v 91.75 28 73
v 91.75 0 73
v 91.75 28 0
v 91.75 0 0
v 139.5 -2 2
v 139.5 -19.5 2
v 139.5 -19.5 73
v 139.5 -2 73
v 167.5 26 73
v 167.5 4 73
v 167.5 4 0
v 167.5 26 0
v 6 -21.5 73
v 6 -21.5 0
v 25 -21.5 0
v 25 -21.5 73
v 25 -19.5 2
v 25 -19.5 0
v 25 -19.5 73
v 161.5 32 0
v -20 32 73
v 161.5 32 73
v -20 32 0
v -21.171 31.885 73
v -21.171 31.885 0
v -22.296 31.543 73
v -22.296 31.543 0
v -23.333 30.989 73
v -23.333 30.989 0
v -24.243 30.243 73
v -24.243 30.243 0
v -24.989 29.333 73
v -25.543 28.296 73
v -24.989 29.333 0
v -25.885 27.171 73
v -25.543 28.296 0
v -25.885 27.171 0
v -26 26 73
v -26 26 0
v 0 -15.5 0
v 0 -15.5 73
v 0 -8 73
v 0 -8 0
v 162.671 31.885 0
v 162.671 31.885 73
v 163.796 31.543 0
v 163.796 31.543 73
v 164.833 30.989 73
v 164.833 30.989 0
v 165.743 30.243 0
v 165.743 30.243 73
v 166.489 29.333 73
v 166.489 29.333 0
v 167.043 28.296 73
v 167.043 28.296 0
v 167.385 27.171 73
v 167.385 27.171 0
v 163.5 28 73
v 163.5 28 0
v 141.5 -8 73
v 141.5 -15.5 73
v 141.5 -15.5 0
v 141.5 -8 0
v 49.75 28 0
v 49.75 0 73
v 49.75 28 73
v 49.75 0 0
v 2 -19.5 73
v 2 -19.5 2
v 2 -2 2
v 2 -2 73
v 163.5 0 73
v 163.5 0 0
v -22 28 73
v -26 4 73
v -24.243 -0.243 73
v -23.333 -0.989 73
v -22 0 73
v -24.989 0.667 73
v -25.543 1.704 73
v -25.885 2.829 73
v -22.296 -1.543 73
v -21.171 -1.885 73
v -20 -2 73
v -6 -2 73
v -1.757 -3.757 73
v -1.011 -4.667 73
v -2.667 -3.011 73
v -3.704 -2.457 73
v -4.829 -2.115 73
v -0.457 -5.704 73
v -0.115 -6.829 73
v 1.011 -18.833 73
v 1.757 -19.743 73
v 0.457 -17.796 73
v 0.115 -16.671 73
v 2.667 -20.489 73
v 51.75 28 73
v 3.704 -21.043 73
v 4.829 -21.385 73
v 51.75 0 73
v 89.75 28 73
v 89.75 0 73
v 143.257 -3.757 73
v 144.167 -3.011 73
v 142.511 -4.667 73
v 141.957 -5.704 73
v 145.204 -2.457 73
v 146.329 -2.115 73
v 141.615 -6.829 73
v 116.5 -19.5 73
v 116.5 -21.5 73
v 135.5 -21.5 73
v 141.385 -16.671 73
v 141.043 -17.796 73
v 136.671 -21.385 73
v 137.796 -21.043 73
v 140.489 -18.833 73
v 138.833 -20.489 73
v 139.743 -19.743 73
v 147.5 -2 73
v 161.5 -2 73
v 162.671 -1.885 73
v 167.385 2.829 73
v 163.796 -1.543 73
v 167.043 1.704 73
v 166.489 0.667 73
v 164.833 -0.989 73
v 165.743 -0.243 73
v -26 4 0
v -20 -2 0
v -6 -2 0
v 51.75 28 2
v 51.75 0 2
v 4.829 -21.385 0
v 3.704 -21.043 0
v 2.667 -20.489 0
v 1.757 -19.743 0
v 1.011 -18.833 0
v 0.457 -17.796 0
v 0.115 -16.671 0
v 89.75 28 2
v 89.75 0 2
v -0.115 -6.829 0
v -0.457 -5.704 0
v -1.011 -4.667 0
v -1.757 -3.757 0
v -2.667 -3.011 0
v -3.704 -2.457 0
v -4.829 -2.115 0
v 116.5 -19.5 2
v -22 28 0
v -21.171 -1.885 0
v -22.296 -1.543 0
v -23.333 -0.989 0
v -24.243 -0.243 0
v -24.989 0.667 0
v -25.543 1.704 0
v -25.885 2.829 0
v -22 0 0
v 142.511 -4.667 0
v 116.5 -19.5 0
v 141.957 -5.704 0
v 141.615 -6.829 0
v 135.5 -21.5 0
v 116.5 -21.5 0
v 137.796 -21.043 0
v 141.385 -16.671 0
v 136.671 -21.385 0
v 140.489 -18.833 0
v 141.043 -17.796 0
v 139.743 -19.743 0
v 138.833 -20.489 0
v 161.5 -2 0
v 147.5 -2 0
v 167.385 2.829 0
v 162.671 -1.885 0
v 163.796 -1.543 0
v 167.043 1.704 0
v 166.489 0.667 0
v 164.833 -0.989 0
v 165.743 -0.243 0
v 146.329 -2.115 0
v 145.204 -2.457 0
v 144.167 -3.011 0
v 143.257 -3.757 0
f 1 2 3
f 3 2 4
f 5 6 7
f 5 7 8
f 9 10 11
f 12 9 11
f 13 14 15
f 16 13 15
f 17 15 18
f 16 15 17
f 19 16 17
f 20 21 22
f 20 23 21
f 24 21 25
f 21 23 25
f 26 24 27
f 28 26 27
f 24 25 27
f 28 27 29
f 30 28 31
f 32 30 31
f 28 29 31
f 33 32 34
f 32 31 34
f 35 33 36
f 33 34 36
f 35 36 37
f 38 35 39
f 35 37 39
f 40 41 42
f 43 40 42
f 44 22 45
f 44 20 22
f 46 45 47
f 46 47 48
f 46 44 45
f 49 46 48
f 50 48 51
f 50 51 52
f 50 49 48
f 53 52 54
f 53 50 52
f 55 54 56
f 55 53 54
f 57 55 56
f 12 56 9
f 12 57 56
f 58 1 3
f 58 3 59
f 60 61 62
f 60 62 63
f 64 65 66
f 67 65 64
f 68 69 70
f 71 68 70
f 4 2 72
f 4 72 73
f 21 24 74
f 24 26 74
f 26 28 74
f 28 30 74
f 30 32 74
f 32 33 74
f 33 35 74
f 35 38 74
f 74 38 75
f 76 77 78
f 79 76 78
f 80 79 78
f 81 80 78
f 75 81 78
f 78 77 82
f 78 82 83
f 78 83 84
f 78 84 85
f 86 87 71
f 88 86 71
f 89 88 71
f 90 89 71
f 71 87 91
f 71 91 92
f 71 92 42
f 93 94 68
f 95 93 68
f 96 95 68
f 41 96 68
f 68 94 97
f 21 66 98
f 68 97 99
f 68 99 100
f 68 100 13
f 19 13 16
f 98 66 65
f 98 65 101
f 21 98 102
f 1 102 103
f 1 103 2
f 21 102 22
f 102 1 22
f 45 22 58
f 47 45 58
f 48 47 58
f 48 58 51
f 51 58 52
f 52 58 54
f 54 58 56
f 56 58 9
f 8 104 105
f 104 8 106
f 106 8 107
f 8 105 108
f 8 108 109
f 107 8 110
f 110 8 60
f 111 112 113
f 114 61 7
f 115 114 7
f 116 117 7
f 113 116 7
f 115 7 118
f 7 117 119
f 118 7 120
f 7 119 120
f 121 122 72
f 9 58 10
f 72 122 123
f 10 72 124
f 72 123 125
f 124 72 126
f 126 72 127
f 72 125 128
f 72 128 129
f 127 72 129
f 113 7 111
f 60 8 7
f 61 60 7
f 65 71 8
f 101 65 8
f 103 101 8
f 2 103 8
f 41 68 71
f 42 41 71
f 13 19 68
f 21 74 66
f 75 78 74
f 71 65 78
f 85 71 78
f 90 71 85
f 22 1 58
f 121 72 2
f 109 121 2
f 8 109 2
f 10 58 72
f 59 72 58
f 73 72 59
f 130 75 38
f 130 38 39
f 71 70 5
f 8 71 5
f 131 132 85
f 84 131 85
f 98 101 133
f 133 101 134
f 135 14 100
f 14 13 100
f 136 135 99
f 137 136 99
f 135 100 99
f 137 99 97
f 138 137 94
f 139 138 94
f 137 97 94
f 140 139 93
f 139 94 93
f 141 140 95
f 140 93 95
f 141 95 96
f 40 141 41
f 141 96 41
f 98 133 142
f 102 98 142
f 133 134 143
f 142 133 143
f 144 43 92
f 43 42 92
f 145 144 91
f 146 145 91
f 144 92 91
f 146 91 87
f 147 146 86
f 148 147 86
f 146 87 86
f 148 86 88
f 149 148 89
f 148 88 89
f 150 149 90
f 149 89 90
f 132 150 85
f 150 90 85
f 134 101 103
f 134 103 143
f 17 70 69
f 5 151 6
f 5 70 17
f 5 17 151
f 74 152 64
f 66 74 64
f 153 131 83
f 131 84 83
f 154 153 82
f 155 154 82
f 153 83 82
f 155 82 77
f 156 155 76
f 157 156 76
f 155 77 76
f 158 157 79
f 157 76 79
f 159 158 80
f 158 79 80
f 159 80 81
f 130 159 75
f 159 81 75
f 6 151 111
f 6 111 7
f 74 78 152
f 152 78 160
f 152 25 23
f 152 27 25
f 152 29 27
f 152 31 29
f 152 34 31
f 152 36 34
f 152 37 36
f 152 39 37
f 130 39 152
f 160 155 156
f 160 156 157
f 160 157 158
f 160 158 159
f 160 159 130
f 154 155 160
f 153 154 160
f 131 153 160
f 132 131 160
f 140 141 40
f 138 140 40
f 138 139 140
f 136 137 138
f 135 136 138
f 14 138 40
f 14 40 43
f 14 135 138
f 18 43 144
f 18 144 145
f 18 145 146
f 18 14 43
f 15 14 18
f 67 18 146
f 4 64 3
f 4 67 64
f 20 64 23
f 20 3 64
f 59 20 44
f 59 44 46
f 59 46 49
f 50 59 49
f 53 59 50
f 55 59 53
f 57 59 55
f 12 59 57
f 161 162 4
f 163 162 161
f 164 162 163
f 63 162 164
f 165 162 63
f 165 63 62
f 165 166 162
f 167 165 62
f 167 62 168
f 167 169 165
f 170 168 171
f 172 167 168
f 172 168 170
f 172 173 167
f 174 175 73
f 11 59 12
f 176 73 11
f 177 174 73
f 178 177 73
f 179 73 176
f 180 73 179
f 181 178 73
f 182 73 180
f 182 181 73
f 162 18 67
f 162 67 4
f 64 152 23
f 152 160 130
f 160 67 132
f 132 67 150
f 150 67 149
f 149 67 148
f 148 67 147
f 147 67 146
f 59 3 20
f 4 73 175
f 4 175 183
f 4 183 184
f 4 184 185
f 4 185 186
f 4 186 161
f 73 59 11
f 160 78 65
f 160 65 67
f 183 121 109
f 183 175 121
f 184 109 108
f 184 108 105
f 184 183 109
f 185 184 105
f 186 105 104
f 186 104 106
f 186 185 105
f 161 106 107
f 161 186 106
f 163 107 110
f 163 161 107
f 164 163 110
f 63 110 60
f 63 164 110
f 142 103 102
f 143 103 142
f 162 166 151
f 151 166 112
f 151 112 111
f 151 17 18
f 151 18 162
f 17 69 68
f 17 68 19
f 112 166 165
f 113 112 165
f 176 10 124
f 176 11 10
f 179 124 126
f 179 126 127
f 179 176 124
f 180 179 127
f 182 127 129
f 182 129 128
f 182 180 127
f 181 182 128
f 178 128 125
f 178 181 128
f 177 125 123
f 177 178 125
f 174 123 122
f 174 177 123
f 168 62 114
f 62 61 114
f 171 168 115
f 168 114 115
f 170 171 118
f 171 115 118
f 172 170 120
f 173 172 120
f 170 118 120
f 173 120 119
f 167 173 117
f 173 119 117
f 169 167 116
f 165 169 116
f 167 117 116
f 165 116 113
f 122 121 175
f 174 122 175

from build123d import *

# Parameters (mm, degrees)
SKETCH2_W            = 141.5
SKETCH2_H            = 21.5
BOSS_EXTRUDE1_DEPTH  = 73
SHELL1_T             = -2
CUT_EXTRUDE1_REACH   = 162.666
SKETCH3_W            = 91.5
SKETCH3_H            = 2
SKETCH7_W            = 73
SKETCH7_H            = 2
BOSS_EXTRUDE5_DEPTH  = 26
SKETCH8_W            = 73
SKETCH8_H            = 2
BOSS_EXTRUDE6_DEPTH  = 26
SKETCH9_W            = 4
SKETCH9_H            = 73
BOSS_EXTRUDE7_DEPTH  = 28
SKETCH10_W           = 193.5
SKETCH10_H           = 73
BOSS_EXTRUDE8_DEPTH  = 4
SKETCH11_W           = 2
SKETCH11_H           = 73
BOSS_EXTRUDE9_DEPTH  = 28
SKETCH13_W           = 38
SKETCH13_H           = 2
BOSS_EXTRUDE10_DEPTH = 28
FILLET1_R            = 6


with BuildPart() as part:
    # Sketch2 → Boss-Extrude1 (new body)
    with BuildSketch(Plane.XY):
        with Locations((70.75, -10.75)):
            Rectangle(SKETCH2_W, SKETCH2_H)
    extrude(amount=BOSS_EXTRUDE1_DEPTH)

    # Shell1
    shell1_openings = [part.faces().sort_by_distance(p)[0] for p in [
        (70.75, -10.75, 73),
    ]]
    offset(amount=SHELL1_T, openings=shell1_openings, kind=Kind.INTERSECTION)

    # Cut-Extrude1: up to this face of the body (flat: up to its plane)
    cut_extrude1_end = Plane(part.part.faces().sort_by_distance((70.75, -10.75, 0))[0])
    # Sketch3 → Cut-Extrude1 (cut, up to the picked face)
    with BuildSketch(Plane.XY.offset(73), mode=Mode.PRIVATE) as cut_extrude1_sk1:
        with Locations((70.75, -20.5)):
            Rectangle(SKETCH3_W, SKETCH3_H)
    cut_extrude1_tool1 = split(extrude(cut_extrude1_sk1.sketch, amount=-CUT_EXTRUDE1_REACH, mode=Mode.PRIVATE), bisect_by=cut_extrude1_end, keep=Keep.BOTH, mode=Mode.PRIVATE)
    add(cut_extrude1_tool1.solids().sort_by(Axis((70.75, -20.5, 73), (0, 0, -1)))[0], mode=Mode.SUBTRACT)

    # Sketch7 → Boss-Extrude5 (add)
    with BuildSketch(Plane.ZY):
        with Locations((36.5, -1)):
            Rectangle(SKETCH7_W, SKETCH7_H)
    extrude(amount=BOSS_EXTRUDE5_DEPTH)

    # Sketch8 → Boss-Extrude6 (add)
    with BuildSketch(Plane(origin=(141.5, 0, 0), x_dir=(0, 0, -1), z_dir=(1, 0, 0))):
        with Locations((-36.5, -1)):
            Rectangle(SKETCH8_W, SKETCH8_H)
    extrude(amount=BOSS_EXTRUDE6_DEPTH)

    # Sketch9 → Boss-Extrude7 (add)
    with BuildSketch(Plane(origin=(0, 0, 0), x_dir=(1, 0, 0), z_dir=(0, 1, 0))):
        with Locations((165.5, -36.5)):
            Rectangle(SKETCH9_W, SKETCH9_H)
        with Locations((-24, -36.5)):
            Rectangle(SKETCH9_W, SKETCH9_H)
    extrude(amount=BOSS_EXTRUDE7_DEPTH)

    # Sketch10 → Boss-Extrude8 (add)
    with BuildSketch(Plane(origin=(0, 28, 0), x_dir=(1, 0, 0), z_dir=(0, 1, 0))):
        with Locations((70.75, -36.5)):
            Rectangle(SKETCH10_W, SKETCH10_H)
    extrude(amount=BOSS_EXTRUDE8_DEPTH)

    # Sketch11 → Boss-Extrude9 (add)
    with BuildSketch(Plane(origin=(0, 0, 0), x_dir=(1, 0, 0), z_dir=(0, 1, 0))):
        with Locations((50.75, -36.5)):
            Rectangle(SKETCH11_W, SKETCH11_H)
        with Locations((90.75, -36.5)):
            Rectangle(SKETCH11_W, SKETCH11_H)
    extrude(amount=BOSS_EXTRUDE9_DEPTH)

    # Sketch13 → Boss-Extrude10 (add)
    with BuildSketch(Plane(origin=(0, 0, 0), x_dir=(1, 0, 0), z_dir=(0, 1, 0))):
        with Locations((70.75, -1)):
            Rectangle(SKETCH13_W, SKETCH13_H)
    extrude(amount=BOSS_EXTRUDE10_DEPTH)

    # Fillet1
    fillet1_edges = [part.edges().sort_by_distance(p)[0] for p in [
        (167.5, 32, 36.5),
        (0, -2, 36.5),
        (-26, -2, 36.5),
        (141.5, -2, 36.5),
        (167.5, -2, 36.5),
        (141.5, -21.5, 36.5),
        (0, -21.5, 36.5),
        (-26, 32, 36.5),
    ]]
    fillet(fillet1_edges, radius=FILLET1_R)


solid = part.part
